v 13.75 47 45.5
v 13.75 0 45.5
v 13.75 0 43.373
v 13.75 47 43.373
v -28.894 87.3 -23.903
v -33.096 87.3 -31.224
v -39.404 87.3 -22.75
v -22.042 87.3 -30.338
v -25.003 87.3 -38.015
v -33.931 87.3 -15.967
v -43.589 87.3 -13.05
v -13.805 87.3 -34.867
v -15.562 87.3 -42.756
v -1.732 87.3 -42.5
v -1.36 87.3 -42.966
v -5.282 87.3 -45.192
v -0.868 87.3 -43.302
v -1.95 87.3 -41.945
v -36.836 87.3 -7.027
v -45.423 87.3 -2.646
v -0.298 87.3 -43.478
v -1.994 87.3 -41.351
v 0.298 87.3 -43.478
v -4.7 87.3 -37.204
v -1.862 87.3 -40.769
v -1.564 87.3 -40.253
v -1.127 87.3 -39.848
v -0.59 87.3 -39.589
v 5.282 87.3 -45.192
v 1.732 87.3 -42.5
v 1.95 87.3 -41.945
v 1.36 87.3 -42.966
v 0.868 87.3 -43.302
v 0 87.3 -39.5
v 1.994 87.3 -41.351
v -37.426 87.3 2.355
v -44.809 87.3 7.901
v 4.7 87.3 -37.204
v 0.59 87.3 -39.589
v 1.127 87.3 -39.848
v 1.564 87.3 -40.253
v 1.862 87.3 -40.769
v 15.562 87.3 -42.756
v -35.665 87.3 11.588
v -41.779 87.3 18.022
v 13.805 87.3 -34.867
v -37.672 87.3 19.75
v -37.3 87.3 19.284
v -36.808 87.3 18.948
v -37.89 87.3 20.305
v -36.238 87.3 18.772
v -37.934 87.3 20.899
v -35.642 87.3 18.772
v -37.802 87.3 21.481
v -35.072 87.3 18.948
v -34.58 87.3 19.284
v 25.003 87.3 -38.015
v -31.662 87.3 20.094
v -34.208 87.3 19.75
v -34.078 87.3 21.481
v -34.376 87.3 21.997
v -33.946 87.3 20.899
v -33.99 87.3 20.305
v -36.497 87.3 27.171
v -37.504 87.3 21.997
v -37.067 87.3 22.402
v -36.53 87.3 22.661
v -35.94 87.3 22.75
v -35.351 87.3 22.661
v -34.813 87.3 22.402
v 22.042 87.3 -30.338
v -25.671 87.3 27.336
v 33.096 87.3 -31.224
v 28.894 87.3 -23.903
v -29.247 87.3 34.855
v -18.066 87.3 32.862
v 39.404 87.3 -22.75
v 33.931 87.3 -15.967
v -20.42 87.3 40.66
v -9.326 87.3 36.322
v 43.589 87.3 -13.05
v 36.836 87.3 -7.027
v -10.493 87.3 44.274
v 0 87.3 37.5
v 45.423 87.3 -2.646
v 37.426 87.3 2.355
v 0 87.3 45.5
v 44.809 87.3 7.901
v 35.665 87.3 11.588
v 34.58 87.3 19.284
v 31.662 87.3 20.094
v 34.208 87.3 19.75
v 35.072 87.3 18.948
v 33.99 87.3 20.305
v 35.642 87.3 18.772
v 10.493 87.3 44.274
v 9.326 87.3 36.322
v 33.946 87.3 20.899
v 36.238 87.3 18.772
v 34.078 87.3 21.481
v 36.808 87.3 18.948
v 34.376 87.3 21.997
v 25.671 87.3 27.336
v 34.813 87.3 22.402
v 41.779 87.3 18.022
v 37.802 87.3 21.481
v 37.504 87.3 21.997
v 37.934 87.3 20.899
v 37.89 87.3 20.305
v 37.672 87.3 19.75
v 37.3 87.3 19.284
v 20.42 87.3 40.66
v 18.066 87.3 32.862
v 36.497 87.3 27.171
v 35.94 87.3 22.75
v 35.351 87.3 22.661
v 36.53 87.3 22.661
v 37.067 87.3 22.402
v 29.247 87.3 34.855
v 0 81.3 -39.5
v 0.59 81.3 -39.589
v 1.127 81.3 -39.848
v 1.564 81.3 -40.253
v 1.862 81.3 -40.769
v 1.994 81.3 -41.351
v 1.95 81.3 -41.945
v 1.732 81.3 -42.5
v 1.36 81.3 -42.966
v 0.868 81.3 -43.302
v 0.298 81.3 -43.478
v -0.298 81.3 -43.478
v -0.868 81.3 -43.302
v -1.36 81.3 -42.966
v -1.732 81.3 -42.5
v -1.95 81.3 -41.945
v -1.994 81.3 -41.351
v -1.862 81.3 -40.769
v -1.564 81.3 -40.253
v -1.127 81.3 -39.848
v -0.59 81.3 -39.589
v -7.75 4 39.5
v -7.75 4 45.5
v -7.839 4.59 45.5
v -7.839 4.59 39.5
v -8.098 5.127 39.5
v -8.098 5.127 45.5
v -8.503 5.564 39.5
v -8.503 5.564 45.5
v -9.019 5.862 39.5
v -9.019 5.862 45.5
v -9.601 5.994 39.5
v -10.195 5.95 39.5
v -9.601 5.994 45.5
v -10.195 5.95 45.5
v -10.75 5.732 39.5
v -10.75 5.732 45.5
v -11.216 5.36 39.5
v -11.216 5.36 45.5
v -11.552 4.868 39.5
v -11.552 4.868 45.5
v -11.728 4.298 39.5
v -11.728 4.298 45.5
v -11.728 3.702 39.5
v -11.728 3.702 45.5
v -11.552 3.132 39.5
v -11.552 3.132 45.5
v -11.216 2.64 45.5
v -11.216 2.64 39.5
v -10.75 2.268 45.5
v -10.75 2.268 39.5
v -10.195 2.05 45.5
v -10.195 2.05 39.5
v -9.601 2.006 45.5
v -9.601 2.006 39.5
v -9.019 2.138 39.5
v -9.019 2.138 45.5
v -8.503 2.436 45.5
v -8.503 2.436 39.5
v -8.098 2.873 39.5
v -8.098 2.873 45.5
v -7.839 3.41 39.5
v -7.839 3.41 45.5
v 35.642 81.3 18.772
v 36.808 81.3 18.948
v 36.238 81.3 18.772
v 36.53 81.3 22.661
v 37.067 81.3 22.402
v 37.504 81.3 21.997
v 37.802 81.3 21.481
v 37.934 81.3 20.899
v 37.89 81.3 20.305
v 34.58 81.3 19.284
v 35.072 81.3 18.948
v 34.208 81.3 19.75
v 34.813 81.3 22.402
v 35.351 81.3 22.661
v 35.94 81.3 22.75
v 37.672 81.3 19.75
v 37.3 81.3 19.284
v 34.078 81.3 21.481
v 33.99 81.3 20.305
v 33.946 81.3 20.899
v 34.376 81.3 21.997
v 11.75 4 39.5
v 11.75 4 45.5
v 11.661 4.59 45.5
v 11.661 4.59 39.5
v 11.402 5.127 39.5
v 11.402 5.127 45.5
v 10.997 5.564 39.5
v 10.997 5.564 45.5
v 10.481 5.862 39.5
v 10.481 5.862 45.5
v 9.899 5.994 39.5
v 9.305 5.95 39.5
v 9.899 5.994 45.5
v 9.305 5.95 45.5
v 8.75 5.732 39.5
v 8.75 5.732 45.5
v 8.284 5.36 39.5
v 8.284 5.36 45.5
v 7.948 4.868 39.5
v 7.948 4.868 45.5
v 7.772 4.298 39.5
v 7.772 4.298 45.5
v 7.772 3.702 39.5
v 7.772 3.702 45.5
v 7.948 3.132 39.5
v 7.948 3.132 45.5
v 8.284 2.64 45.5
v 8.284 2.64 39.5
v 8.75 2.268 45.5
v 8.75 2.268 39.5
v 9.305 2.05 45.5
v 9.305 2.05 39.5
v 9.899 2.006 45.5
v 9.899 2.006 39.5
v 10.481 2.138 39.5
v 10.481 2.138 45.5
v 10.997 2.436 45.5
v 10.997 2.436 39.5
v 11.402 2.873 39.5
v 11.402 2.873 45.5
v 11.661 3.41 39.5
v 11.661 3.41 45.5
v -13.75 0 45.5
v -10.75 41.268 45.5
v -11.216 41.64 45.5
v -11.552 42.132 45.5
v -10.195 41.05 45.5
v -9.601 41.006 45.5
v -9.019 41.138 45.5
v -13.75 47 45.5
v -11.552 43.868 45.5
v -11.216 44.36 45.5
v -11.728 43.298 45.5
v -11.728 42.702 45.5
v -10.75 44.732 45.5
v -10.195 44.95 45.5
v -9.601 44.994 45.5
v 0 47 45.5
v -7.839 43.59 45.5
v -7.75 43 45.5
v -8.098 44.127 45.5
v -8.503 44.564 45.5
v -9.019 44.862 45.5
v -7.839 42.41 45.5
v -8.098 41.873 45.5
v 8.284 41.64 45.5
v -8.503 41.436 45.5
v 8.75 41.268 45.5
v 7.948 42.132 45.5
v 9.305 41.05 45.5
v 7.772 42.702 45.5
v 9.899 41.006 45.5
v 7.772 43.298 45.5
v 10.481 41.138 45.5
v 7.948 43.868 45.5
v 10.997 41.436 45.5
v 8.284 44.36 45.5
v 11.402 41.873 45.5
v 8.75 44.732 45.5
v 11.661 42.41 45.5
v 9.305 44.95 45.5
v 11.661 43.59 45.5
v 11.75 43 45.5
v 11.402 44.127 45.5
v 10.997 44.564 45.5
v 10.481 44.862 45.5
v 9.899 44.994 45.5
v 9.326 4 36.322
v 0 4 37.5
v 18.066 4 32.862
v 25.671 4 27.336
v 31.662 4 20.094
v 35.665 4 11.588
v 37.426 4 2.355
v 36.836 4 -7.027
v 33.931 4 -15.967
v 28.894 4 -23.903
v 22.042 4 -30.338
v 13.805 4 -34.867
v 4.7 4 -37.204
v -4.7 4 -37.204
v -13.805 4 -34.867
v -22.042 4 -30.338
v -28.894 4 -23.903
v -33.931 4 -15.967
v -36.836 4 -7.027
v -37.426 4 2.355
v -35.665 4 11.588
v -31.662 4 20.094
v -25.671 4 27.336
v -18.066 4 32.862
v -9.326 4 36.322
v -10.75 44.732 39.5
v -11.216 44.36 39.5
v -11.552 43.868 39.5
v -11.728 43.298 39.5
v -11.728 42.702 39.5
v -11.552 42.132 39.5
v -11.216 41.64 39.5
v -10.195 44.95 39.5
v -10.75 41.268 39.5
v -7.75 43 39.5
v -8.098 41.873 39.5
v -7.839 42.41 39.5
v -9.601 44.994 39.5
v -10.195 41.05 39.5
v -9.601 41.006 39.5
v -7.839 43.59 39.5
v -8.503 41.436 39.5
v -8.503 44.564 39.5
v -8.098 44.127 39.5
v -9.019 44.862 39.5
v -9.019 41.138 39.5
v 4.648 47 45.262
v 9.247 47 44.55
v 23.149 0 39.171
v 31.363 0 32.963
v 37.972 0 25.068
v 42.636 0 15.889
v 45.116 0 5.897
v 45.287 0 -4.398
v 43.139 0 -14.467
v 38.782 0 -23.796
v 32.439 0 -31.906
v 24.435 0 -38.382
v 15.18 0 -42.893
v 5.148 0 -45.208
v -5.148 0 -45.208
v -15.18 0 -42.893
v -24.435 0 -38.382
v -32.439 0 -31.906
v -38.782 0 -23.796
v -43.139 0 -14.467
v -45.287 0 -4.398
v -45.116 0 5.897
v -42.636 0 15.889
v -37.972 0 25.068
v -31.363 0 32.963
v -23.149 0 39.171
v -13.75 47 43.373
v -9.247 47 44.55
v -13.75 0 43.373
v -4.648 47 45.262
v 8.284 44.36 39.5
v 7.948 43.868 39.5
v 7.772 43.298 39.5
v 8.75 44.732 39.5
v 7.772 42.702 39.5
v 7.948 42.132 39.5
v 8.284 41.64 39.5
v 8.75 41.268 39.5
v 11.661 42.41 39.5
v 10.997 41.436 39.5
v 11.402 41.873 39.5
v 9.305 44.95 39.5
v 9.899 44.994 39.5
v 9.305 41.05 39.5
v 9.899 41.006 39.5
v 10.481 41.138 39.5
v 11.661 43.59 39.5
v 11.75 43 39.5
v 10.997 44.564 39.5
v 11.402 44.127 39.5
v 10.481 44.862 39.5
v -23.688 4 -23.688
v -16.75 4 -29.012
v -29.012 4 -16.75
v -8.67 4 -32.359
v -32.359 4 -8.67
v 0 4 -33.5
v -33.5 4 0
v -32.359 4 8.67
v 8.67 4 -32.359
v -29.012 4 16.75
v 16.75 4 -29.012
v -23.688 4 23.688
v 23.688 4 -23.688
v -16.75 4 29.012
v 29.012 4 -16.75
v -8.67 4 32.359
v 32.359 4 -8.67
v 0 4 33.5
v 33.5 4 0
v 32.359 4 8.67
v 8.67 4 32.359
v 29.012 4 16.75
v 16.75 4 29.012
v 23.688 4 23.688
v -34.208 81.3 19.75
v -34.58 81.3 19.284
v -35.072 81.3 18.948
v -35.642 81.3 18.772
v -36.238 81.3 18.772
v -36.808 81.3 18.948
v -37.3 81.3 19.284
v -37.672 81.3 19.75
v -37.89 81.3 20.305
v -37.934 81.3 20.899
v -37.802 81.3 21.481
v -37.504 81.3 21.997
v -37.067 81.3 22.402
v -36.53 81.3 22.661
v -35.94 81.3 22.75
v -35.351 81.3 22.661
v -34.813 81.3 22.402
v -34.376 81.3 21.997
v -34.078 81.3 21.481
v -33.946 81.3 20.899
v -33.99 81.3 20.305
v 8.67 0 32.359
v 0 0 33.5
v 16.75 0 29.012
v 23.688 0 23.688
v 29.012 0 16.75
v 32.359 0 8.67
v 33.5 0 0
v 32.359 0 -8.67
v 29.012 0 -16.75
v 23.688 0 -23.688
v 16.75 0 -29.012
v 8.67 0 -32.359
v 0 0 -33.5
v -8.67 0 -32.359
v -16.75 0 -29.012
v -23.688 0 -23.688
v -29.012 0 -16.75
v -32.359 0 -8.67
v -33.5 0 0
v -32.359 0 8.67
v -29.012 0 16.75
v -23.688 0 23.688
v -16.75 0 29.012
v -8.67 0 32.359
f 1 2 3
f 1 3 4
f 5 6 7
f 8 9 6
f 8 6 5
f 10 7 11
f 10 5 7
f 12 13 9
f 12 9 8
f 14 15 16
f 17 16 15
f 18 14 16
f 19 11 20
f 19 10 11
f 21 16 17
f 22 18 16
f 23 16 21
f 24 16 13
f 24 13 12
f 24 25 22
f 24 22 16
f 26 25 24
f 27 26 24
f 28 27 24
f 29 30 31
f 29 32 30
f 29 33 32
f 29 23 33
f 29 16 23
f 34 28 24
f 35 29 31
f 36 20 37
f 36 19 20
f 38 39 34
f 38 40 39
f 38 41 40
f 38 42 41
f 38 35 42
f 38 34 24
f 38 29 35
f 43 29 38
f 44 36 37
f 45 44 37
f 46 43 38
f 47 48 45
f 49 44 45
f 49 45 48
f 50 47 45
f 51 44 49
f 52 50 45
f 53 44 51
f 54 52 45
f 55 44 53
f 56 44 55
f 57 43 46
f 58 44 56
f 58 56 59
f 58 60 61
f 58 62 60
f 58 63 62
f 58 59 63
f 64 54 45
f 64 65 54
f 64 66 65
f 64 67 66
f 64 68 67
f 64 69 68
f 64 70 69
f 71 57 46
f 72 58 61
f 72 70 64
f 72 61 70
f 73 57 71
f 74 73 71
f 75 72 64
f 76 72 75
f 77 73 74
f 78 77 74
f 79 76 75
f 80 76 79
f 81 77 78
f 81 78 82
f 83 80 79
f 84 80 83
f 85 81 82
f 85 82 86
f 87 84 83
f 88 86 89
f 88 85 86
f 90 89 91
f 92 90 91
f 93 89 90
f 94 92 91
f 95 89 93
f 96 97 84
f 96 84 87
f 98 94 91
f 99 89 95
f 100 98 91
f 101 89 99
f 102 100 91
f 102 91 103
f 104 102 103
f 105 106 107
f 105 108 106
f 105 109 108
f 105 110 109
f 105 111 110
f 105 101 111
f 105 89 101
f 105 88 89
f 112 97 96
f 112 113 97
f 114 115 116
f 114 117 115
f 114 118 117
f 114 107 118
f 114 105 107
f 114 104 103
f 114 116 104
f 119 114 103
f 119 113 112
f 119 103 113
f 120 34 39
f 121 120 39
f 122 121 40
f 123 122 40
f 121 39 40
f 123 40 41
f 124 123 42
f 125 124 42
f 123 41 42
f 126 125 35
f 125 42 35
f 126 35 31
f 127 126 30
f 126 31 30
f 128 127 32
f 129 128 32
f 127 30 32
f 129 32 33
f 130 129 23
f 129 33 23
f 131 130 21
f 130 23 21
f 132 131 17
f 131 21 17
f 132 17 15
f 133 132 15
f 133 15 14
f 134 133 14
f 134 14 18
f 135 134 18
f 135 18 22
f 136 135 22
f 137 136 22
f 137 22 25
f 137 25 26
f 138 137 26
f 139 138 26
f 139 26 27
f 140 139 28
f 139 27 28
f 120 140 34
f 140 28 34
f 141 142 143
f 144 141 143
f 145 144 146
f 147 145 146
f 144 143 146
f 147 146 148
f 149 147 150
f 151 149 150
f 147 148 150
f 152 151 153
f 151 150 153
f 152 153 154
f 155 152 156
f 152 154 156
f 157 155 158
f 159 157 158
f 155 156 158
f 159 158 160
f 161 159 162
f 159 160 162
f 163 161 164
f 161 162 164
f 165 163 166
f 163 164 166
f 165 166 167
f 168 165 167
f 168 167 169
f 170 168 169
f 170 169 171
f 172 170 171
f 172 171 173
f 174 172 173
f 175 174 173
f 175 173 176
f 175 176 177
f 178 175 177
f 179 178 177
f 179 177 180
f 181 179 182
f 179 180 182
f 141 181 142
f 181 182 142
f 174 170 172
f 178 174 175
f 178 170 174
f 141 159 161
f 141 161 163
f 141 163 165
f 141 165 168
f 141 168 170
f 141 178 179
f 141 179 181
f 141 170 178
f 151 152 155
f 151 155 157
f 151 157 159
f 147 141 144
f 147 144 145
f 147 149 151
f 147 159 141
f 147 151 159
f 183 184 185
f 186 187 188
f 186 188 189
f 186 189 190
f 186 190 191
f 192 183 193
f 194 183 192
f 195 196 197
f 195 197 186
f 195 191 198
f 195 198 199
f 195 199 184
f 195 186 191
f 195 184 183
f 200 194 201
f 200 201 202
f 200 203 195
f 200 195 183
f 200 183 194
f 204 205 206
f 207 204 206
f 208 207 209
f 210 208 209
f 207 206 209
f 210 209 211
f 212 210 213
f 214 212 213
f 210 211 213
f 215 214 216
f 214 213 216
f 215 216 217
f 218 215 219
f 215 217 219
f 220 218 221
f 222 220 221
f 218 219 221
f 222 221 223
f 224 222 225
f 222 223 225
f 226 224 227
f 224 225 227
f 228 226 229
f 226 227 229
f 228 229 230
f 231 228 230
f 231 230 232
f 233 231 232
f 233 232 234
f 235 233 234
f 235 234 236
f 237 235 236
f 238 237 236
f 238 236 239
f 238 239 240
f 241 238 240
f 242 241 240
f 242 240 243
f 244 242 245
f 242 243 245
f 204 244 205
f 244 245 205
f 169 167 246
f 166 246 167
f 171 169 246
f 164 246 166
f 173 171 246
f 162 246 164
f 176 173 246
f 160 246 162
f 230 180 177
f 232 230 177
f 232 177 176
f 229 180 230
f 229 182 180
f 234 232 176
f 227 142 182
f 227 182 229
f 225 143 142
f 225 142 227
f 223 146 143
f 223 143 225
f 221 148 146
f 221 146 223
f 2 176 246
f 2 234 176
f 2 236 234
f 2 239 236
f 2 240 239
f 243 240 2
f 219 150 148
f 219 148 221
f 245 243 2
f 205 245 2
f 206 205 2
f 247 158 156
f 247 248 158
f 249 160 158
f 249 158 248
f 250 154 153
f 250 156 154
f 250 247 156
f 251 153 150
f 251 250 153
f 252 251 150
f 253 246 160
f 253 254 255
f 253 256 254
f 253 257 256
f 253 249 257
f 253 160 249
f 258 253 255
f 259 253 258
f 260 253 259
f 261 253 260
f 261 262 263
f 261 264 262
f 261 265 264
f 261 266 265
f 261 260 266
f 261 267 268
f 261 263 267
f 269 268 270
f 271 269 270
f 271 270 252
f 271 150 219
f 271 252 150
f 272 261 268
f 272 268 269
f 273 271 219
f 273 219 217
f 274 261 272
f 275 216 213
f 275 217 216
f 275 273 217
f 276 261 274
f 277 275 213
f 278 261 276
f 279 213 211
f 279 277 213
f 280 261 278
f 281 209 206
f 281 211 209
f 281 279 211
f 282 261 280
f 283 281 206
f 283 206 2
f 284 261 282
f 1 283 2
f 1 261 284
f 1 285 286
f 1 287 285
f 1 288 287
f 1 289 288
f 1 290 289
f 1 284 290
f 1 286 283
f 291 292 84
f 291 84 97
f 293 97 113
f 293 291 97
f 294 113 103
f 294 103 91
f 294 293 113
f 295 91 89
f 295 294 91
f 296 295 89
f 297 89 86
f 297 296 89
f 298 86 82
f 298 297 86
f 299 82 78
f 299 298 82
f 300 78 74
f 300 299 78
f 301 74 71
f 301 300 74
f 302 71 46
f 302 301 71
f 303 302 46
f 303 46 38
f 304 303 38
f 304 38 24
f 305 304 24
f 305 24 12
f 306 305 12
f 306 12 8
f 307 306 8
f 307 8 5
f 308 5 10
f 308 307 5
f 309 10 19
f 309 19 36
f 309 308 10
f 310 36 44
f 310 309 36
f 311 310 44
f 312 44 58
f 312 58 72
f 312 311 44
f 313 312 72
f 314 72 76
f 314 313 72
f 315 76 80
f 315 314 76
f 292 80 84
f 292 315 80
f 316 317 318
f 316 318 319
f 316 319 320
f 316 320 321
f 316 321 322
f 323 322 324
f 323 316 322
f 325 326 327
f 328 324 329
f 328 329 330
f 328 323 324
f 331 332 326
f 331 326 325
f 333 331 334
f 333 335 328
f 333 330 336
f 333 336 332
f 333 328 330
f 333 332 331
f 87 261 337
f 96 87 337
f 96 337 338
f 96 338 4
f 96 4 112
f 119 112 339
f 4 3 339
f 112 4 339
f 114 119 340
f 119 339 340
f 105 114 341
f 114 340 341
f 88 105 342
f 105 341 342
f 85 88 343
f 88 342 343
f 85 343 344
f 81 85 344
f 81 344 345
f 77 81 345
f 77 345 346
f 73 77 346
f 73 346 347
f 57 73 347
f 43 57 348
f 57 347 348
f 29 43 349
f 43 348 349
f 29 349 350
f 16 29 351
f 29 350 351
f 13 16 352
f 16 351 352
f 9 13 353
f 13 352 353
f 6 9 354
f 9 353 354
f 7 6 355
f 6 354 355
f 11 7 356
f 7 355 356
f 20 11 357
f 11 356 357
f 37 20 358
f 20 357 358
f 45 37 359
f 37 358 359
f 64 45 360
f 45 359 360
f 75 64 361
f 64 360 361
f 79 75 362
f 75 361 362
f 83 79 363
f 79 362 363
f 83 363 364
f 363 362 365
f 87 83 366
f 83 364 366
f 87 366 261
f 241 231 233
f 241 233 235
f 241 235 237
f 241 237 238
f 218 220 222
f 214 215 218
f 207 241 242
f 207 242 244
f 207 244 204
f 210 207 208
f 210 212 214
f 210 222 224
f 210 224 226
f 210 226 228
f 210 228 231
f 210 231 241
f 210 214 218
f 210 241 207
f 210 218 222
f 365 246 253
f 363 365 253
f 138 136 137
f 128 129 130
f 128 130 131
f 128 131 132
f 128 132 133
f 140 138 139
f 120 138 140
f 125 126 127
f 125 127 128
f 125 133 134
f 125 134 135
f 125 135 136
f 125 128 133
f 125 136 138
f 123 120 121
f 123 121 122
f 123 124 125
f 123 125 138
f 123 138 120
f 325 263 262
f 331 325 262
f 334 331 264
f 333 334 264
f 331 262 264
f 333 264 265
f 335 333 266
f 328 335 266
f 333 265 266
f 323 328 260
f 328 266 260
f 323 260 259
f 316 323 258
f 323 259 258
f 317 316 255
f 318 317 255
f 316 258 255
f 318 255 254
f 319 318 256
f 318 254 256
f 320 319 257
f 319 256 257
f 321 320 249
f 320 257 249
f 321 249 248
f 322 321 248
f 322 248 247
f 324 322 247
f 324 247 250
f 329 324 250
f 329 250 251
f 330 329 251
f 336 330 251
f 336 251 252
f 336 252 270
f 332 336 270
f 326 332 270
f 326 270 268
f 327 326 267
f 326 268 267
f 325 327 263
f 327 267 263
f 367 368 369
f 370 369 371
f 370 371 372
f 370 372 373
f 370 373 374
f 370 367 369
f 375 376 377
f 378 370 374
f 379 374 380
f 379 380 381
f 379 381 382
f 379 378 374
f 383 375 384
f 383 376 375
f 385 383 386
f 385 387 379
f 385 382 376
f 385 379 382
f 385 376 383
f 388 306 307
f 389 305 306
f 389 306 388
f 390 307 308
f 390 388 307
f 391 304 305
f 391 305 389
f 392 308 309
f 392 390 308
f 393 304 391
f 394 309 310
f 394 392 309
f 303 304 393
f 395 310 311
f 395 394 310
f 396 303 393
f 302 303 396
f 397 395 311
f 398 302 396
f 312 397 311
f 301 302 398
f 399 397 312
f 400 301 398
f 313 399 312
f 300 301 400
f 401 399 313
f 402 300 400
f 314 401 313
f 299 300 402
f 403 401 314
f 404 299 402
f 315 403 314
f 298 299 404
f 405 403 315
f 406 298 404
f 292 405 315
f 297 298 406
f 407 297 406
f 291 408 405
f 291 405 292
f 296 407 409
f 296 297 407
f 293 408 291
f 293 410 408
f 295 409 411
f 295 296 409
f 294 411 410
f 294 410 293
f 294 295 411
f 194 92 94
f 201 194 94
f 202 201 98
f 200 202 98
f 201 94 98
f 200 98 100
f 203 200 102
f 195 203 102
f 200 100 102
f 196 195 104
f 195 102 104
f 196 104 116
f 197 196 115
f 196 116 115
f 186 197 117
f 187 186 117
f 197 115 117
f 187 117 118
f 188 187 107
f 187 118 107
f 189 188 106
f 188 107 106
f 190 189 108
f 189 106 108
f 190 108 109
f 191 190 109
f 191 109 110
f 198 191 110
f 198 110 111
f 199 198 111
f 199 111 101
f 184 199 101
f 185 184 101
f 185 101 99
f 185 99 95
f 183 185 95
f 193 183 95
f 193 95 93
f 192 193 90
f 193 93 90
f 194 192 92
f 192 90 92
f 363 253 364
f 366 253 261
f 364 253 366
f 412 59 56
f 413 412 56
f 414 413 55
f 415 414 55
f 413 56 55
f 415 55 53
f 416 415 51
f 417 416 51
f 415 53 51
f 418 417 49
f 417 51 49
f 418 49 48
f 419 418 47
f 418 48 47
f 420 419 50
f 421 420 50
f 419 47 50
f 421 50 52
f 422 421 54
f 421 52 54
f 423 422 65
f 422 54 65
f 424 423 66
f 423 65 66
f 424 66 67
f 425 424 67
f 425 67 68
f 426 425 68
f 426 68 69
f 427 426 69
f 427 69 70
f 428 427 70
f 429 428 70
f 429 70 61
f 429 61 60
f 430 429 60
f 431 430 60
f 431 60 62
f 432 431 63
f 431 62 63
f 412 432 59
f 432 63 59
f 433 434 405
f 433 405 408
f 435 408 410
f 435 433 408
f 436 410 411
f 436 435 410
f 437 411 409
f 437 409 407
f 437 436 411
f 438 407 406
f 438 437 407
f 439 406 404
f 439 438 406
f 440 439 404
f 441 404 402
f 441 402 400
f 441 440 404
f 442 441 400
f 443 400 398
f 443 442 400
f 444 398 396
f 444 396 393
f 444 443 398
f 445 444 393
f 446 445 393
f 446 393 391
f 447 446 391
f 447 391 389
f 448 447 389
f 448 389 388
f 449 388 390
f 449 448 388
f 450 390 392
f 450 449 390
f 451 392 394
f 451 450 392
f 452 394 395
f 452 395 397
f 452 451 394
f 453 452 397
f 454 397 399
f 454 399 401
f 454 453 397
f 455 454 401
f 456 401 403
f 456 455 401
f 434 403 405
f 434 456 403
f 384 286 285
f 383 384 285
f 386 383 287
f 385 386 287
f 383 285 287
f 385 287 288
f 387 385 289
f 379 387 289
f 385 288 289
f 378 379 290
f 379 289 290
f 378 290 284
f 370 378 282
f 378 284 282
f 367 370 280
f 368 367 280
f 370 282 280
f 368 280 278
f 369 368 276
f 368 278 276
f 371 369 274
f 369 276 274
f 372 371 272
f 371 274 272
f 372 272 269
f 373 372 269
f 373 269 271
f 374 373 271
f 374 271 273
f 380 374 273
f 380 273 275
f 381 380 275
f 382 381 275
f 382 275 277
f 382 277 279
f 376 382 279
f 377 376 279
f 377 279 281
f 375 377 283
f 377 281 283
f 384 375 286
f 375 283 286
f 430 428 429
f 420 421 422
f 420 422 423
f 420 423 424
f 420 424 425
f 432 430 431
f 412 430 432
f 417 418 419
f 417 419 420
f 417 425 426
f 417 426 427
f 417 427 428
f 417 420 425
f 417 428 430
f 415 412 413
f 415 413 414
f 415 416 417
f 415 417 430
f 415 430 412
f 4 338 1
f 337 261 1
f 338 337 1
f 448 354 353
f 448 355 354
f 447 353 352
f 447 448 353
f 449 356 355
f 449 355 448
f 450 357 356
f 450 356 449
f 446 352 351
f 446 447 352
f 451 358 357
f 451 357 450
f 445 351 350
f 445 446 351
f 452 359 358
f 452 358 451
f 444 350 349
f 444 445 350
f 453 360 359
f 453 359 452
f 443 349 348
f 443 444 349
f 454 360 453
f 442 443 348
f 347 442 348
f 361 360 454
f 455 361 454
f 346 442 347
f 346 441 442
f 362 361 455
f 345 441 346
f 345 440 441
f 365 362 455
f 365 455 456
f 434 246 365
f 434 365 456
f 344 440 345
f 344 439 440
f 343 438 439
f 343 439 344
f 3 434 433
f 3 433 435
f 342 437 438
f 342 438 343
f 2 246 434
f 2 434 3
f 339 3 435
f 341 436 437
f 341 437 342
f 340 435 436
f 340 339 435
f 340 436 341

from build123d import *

# Parameters (mm, degrees)
SKETCH1_R                = 45.5
SKETCH1_R_2              = 33.5
BOSS_EXTRUDE1_DEPTH      = 4
SKETCH2_R                = 45.5
SKETCH2_R_2              = 37.5
BOSS_EXTRUDE2_DEPTH      = 83.3
SKETCH4_R                = 2
CUT_EXTRUDE1_DEPTH       = 6
CIRPATTERN1_COUNT        = 3
BOSS_EXTRUDE4_REACH      = 136.062
BOSS_EXTRUDE4_END_RADIUS = 45.5
SKETCH7_W                = 27.5
SKETCH7_H                = 47
SKETCH9_R                = 2
CUT_EXTRUDE2_DEPTH       = 6
SKETCH10_R               = 2
CUT_EXTRUDE3_DEPTH       = 6


with BuildPart() as part:
    # Sketch1 → Boss-Extrude1 (new body)
    with BuildSketch(Plane(origin=(0, 0, 0), x_dir=(1, 0, 0), z_dir=(0, 1, 0))):
        with Locations(Location((0, 0, 0), (0, 0, 270))):
            Circle(SKETCH1_R)
        with Locations(Location((0, 0, 0), (0, 0, 270))):
            Circle(SKETCH1_R_2, mode=Mode.SUBTRACT)
    extrude(amount=BOSS_EXTRUDE1_DEPTH)

    # Sketch2 → Boss-Extrude2 (add)
    with BuildSketch(Plane(origin=(0, 4, 0), x_dir=(1, 0, 0), z_dir=(0, 1, 0))):
        with Locations(Location((0, 0, 0), (0, 0, 270))):
            Circle(SKETCH2_R)
        with Locations(Location((0, 0, 0), (0, 0, 270))):
            Circle(SKETCH2_R_2, mode=Mode.SUBTRACT)
    extrude(amount=BOSS_EXTRUDE2_DEPTH)

    # Sketch4 → Cut-Extrude1 (cut)
    with BuildSketch(Plane(origin=(0, 87.3, 0), x_dir=(1, 0, 0), z_dir=(0, 1, 0))):
        with Locations(Location((0, 41.5, 0), (0, 0, 270))):
            Circle(SKETCH4_R)
    cut_extrude1 = extrude(amount=-CUT_EXTRUDE1_DEPTH, mode=Mode.SUBTRACT)

    # CirPattern1: Cut-Extrude1 ×3 about axis
    cirpattern1_axis = Axis((0, 0, 0), (0, 1, 0))
    for i in range(1, CIRPATTERN1_COUNT):
        add(cut_extrude1.rotate(cirpattern1_axis, i * 360 / CIRPATTERN1_COUNT), mode=Mode.SUBTRACT)

    # Boss-Extrude4: up to this cylinder (the profile starts outside it)
    boss_extrude4_end = Plane(origin=(0, 23.5, 0), z_dir=(0, -1, 0)) * Cylinder(BOSS_EXTRUDE4_END_RADIUS, 364.124, mode=Mode.PRIVATE)
    # Sketch7 → Boss-Extrude4 (add, up to the surface)
    with BuildSketch(Plane(origin=(0, 87.3, 45.5), x_dir=(1, 0, 0), z_dir=(0, 0, 1)), mode=Mode.PRIVATE) as boss_extrude4_sk1:
        with Locations((0, -63.8)):
            Rectangle(SKETCH7_W, SKETCH7_H)
    boss_extrude4_tool1 = extrude(boss_extrude4_sk1.sketch, amount=-BOSS_EXTRUDE4_REACH, mode=Mode.PRIVATE) - boss_extrude4_end
    add(boss_extrude4_tool1.solids().sort_by_distance((0, 23.5, 45.5))[0])
    add(boss_extrude4_tool1.solids().sort_by_distance((0, 23.5, 45.5))[1])

    # Sketch9 → Cut-Extrude2 (cut)
    with BuildSketch(Plane.XY.offset(45.5)):
        with Locations((-9.75, 4)):
            Circle(SKETCH9_R)
        with Locations((9.75, 4)):
            Circle(SKETCH9_R)
    extrude(amount=-CUT_EXTRUDE2_DEPTH, mode=Mode.SUBTRACT)

    # Sketch10 → Cut-Extrude3 (cut)
    with BuildSketch(Plane.XY.offset(45.5)):
        with Locations((-9.75, 43)):
            Circle(SKETCH10_R)
        with Locations((9.75, 43)):
            Circle(SKETCH10_R)
    extrude(amount=-CUT_EXTRUDE3_DEPTH, mode=Mode.SUBTRACT)


solid = part.part
